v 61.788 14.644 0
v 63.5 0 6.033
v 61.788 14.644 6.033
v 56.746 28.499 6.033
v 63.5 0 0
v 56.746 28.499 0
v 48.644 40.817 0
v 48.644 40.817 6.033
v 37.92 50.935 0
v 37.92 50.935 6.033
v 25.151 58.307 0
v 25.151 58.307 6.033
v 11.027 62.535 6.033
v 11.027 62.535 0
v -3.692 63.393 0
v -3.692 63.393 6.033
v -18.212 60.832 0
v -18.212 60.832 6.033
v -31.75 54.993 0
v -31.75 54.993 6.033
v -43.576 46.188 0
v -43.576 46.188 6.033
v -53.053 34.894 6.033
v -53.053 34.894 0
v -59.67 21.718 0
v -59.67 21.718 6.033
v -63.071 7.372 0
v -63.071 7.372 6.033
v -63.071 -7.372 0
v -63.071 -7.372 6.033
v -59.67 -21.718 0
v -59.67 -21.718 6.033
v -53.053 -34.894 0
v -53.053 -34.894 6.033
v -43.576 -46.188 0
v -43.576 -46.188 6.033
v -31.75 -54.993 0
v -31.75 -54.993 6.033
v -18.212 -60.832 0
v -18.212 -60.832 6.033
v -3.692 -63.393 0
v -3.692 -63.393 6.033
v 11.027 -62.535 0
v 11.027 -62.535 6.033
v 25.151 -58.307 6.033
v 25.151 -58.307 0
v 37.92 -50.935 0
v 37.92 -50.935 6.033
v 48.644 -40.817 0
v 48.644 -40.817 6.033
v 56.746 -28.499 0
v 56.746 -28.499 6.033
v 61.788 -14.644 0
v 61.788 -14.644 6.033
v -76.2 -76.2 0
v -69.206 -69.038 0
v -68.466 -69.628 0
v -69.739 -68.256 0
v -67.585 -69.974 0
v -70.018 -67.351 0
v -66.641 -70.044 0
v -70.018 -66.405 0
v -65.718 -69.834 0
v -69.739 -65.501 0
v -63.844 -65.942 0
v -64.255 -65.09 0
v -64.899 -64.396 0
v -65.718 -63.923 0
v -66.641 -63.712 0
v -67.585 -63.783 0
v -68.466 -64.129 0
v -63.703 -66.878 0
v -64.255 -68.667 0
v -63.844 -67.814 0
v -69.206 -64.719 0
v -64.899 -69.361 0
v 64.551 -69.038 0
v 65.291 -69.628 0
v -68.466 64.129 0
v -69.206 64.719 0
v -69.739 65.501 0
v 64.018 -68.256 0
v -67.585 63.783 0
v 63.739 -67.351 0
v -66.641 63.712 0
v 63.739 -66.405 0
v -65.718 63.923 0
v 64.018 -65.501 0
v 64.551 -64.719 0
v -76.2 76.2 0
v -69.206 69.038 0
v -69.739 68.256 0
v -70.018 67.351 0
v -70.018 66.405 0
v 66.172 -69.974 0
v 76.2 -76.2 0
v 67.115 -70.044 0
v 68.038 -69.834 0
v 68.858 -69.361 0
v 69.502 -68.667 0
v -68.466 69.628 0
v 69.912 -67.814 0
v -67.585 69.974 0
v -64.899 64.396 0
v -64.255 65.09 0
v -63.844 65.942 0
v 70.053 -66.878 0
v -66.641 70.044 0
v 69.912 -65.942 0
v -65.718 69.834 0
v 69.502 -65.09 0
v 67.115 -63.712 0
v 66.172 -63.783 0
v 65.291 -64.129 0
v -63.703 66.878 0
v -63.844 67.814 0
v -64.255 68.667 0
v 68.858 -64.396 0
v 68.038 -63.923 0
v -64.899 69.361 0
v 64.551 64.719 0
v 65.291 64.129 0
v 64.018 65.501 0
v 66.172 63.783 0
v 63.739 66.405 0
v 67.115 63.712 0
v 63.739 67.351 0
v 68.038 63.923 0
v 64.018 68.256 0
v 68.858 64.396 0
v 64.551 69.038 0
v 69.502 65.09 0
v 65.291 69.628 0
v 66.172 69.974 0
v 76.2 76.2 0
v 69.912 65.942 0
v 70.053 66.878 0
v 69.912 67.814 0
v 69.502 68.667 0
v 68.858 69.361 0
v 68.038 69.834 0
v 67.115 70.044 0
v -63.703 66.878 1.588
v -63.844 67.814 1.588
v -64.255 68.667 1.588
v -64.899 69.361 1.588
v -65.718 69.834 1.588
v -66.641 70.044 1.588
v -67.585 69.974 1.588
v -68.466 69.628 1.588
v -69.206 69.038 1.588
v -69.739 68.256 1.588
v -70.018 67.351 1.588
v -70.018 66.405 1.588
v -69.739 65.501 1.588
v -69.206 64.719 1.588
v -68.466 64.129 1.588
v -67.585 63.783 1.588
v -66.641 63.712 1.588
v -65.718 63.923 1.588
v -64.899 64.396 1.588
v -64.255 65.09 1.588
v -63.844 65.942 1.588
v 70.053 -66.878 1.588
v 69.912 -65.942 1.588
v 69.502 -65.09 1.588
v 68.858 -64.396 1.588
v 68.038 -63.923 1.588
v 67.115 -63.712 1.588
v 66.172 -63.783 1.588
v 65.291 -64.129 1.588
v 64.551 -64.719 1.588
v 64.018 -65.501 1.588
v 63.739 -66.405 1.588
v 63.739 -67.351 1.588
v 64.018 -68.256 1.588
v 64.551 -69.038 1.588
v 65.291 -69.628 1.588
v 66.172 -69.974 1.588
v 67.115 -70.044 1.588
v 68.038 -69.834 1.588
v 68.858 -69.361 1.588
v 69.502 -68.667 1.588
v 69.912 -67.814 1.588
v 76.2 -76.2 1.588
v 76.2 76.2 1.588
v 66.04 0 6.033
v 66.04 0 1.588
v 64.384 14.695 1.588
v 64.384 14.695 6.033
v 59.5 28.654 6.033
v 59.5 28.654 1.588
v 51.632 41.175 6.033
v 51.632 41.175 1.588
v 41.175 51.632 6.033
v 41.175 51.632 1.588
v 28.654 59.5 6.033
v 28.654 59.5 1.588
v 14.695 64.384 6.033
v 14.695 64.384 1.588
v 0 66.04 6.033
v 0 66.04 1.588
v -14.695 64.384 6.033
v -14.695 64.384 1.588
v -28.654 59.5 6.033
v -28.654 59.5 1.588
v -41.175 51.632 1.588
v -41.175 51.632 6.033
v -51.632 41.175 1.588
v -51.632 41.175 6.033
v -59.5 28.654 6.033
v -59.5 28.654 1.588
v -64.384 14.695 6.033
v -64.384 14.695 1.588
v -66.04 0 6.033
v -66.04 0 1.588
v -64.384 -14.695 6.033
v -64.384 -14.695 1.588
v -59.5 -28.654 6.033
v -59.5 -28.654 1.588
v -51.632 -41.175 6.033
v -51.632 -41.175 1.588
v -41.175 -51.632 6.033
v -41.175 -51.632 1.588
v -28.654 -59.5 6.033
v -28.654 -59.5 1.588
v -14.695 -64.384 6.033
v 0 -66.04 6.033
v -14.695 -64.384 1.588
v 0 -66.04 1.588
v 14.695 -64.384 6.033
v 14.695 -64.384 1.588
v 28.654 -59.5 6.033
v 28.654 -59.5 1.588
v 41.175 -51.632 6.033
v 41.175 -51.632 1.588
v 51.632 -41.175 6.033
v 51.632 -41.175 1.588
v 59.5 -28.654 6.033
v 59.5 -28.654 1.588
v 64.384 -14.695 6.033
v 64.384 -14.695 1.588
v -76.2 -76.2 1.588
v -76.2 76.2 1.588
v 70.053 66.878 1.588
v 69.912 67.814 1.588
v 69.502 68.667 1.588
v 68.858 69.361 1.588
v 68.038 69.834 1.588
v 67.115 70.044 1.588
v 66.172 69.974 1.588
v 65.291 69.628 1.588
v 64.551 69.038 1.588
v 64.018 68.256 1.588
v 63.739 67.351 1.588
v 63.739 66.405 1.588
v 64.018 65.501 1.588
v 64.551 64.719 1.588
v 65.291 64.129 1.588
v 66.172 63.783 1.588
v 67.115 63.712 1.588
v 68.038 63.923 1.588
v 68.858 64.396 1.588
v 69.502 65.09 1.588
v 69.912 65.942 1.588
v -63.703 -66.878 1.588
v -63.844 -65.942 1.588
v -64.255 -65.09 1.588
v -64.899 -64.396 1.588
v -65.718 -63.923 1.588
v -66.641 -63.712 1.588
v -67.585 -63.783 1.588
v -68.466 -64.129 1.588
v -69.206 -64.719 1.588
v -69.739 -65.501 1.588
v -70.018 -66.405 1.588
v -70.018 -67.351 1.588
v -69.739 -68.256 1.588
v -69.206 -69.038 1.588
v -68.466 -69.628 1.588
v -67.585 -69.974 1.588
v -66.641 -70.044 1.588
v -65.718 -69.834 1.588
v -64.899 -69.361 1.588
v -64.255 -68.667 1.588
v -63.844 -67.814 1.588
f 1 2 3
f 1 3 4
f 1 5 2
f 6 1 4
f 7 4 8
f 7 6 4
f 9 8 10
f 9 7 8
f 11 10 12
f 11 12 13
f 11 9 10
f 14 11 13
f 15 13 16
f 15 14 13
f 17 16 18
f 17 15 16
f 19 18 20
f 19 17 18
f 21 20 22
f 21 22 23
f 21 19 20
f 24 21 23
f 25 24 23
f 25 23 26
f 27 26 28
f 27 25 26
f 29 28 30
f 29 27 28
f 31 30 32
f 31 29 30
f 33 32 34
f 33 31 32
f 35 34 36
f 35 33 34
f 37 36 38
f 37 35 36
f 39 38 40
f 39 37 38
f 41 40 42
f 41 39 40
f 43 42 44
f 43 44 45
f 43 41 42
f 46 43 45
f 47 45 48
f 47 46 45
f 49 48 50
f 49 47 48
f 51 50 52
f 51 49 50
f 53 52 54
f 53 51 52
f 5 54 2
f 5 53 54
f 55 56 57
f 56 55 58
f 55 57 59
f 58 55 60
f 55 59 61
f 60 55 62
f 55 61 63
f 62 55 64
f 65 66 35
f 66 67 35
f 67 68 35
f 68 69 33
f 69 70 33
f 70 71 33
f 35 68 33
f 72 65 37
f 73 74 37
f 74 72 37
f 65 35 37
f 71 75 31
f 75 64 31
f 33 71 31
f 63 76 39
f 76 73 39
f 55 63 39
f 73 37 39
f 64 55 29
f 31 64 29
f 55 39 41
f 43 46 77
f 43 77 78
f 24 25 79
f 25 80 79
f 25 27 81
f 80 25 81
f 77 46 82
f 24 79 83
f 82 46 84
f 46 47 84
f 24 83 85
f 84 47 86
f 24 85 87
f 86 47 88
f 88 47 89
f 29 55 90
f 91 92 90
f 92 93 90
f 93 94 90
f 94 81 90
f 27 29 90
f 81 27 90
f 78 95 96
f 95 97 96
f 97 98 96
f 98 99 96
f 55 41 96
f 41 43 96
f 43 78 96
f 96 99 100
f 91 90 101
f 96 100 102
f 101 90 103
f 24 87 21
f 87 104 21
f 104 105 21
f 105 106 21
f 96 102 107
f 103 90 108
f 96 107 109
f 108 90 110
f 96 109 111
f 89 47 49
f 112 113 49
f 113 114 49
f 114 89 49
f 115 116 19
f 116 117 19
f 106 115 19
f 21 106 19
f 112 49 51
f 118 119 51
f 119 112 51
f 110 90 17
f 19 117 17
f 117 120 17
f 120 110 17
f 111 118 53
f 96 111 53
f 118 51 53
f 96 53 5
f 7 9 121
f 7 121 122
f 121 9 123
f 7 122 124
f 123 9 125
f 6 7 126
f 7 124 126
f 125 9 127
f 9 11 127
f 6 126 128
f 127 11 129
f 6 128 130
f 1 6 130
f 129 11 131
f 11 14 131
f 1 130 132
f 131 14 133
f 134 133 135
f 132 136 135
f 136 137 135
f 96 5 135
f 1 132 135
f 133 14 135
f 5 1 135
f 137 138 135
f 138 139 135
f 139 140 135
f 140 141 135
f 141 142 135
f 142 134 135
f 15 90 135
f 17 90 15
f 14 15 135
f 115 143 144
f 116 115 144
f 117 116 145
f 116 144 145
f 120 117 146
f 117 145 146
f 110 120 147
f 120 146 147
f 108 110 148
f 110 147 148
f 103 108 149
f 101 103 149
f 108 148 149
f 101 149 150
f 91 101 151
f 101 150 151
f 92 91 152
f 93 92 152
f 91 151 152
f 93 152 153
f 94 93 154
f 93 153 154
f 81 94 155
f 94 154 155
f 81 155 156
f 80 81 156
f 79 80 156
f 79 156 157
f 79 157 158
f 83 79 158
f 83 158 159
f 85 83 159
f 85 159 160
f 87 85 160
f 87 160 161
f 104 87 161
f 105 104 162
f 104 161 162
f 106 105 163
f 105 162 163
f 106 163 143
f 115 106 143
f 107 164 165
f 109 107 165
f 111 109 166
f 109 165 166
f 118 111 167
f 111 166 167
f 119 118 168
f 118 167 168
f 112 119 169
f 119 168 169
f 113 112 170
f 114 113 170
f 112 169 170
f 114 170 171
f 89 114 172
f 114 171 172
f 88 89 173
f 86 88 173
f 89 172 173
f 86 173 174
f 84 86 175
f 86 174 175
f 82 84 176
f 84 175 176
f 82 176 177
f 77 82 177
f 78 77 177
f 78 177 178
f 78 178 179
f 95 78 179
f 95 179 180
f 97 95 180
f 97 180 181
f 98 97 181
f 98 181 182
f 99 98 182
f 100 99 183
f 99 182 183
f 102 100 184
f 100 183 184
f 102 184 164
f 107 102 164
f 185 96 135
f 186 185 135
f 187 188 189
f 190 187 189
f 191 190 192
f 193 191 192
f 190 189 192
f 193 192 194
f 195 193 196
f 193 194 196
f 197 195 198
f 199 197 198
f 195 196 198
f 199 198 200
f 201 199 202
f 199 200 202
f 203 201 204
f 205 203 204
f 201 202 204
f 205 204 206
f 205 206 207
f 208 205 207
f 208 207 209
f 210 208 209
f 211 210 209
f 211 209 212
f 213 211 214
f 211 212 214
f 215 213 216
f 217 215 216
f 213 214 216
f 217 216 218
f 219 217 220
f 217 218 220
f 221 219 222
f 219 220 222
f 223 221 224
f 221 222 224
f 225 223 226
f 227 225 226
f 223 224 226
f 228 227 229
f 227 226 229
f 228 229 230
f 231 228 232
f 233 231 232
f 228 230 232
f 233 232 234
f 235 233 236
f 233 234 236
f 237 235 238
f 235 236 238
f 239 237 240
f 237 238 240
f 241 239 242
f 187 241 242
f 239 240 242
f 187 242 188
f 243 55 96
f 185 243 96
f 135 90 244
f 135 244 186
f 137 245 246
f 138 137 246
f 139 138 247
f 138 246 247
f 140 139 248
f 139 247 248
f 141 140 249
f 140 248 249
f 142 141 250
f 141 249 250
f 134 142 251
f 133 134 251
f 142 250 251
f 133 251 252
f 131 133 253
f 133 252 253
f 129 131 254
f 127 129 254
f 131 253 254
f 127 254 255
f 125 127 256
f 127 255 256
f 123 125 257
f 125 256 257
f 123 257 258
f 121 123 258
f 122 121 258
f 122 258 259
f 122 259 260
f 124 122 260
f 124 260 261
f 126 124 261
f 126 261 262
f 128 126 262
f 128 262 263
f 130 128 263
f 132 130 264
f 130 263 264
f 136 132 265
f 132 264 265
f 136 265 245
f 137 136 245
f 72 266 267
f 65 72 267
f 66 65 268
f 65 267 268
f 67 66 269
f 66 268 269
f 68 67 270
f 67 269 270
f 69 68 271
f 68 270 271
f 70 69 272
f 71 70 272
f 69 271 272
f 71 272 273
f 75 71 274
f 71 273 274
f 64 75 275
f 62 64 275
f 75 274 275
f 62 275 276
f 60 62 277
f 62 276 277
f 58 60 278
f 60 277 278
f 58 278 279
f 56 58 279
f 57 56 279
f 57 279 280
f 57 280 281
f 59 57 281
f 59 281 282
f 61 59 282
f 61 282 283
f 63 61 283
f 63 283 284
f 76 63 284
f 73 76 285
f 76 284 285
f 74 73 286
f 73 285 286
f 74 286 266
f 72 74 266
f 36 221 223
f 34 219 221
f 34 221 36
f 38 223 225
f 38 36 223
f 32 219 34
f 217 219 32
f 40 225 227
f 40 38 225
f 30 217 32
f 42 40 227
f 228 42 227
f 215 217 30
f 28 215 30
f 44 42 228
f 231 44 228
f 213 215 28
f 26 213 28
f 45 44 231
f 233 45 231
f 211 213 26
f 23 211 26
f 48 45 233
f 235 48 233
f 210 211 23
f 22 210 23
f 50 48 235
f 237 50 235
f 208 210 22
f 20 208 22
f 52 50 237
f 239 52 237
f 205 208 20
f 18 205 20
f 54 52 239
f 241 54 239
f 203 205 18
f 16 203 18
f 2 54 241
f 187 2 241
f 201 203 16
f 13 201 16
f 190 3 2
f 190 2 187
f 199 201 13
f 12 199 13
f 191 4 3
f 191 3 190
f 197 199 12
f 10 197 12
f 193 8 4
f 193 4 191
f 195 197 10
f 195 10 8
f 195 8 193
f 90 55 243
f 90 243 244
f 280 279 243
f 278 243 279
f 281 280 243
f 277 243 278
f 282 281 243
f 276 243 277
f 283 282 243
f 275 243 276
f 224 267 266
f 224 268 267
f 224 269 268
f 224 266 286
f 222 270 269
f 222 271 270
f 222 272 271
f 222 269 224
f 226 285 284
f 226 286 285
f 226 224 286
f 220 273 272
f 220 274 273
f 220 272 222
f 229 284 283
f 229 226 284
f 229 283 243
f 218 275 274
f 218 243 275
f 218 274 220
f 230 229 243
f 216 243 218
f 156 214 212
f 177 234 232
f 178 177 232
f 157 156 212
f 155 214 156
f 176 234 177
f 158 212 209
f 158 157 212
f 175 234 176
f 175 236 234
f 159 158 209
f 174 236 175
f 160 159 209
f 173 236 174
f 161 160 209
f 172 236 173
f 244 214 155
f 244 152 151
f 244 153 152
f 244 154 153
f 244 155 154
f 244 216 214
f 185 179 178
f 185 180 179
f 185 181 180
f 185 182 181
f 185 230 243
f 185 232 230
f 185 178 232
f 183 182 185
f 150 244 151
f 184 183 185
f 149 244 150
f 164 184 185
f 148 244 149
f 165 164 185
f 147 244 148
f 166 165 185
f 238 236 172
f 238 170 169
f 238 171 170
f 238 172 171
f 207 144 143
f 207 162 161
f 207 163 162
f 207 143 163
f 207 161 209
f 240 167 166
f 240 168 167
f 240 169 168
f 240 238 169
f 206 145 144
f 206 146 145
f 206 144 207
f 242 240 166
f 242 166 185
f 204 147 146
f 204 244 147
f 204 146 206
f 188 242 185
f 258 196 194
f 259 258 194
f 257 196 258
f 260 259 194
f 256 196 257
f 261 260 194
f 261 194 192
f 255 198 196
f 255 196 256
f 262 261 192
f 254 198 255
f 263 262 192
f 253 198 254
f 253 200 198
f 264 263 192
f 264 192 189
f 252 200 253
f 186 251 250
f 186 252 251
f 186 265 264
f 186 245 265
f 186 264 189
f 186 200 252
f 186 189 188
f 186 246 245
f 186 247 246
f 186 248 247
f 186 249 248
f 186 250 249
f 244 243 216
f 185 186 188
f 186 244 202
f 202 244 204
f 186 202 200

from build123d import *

# Parameters (mm, degrees)
SKETCH1_W           = 152.4
SKETCH1_H           = 152.4
SKETCH1_R           = 63.5
BOSS_EXTRUDE1_DEPTH = 1.5875
SKETCH2_R           = 66.04
SKETCH2_R_2         = 63.5
BOSS_EXTRUDE2_DEPTH = 4.445
SKETCH3_R           = 3.175
CUT_EXTRUDE1_DEPTH  = 1.5875


with BuildPart() as part:
    # Sketch1 → Boss-Extrude1 (new body)
    with BuildSketch(Plane.XY):
        Rectangle(SKETCH1_W, SKETCH1_H)
        Circle(SKETCH1_R, mode=Mode.SUBTRACT)
    extrude(amount=BOSS_EXTRUDE1_DEPTH)

    # Sketch2 → Boss-Extrude2 (add)
    with BuildSketch(Plane.XY.offset(1.5875)):
        Circle(SKETCH2_R)
        Circle(SKETCH2_R_2, mode=Mode.SUBTRACT)
    extrude(amount=BOSS_EXTRUDE2_DEPTH)

    # Sketch3 → Cut-Extrude1 (cut)
    with BuildSketch(Plane.XY.offset(1.5875)):
        with Locations((66.8782, -66.8782)):
            Circle(SKETCH3_R)
        with Locations((-66.8782, -66.8782)):
            Circle(SKETCH3_R)
        with Locations((-66.8782, 66.8782)):
            Circle(SKETCH3_R)
        with Locations((66.8782, 66.8782)):
            Circle(SKETCH3_R)
    extrude(amount=-CUT_EXTRUDE1_DEPTH, mode=Mode.SUBTRACT)


solid = part.part
